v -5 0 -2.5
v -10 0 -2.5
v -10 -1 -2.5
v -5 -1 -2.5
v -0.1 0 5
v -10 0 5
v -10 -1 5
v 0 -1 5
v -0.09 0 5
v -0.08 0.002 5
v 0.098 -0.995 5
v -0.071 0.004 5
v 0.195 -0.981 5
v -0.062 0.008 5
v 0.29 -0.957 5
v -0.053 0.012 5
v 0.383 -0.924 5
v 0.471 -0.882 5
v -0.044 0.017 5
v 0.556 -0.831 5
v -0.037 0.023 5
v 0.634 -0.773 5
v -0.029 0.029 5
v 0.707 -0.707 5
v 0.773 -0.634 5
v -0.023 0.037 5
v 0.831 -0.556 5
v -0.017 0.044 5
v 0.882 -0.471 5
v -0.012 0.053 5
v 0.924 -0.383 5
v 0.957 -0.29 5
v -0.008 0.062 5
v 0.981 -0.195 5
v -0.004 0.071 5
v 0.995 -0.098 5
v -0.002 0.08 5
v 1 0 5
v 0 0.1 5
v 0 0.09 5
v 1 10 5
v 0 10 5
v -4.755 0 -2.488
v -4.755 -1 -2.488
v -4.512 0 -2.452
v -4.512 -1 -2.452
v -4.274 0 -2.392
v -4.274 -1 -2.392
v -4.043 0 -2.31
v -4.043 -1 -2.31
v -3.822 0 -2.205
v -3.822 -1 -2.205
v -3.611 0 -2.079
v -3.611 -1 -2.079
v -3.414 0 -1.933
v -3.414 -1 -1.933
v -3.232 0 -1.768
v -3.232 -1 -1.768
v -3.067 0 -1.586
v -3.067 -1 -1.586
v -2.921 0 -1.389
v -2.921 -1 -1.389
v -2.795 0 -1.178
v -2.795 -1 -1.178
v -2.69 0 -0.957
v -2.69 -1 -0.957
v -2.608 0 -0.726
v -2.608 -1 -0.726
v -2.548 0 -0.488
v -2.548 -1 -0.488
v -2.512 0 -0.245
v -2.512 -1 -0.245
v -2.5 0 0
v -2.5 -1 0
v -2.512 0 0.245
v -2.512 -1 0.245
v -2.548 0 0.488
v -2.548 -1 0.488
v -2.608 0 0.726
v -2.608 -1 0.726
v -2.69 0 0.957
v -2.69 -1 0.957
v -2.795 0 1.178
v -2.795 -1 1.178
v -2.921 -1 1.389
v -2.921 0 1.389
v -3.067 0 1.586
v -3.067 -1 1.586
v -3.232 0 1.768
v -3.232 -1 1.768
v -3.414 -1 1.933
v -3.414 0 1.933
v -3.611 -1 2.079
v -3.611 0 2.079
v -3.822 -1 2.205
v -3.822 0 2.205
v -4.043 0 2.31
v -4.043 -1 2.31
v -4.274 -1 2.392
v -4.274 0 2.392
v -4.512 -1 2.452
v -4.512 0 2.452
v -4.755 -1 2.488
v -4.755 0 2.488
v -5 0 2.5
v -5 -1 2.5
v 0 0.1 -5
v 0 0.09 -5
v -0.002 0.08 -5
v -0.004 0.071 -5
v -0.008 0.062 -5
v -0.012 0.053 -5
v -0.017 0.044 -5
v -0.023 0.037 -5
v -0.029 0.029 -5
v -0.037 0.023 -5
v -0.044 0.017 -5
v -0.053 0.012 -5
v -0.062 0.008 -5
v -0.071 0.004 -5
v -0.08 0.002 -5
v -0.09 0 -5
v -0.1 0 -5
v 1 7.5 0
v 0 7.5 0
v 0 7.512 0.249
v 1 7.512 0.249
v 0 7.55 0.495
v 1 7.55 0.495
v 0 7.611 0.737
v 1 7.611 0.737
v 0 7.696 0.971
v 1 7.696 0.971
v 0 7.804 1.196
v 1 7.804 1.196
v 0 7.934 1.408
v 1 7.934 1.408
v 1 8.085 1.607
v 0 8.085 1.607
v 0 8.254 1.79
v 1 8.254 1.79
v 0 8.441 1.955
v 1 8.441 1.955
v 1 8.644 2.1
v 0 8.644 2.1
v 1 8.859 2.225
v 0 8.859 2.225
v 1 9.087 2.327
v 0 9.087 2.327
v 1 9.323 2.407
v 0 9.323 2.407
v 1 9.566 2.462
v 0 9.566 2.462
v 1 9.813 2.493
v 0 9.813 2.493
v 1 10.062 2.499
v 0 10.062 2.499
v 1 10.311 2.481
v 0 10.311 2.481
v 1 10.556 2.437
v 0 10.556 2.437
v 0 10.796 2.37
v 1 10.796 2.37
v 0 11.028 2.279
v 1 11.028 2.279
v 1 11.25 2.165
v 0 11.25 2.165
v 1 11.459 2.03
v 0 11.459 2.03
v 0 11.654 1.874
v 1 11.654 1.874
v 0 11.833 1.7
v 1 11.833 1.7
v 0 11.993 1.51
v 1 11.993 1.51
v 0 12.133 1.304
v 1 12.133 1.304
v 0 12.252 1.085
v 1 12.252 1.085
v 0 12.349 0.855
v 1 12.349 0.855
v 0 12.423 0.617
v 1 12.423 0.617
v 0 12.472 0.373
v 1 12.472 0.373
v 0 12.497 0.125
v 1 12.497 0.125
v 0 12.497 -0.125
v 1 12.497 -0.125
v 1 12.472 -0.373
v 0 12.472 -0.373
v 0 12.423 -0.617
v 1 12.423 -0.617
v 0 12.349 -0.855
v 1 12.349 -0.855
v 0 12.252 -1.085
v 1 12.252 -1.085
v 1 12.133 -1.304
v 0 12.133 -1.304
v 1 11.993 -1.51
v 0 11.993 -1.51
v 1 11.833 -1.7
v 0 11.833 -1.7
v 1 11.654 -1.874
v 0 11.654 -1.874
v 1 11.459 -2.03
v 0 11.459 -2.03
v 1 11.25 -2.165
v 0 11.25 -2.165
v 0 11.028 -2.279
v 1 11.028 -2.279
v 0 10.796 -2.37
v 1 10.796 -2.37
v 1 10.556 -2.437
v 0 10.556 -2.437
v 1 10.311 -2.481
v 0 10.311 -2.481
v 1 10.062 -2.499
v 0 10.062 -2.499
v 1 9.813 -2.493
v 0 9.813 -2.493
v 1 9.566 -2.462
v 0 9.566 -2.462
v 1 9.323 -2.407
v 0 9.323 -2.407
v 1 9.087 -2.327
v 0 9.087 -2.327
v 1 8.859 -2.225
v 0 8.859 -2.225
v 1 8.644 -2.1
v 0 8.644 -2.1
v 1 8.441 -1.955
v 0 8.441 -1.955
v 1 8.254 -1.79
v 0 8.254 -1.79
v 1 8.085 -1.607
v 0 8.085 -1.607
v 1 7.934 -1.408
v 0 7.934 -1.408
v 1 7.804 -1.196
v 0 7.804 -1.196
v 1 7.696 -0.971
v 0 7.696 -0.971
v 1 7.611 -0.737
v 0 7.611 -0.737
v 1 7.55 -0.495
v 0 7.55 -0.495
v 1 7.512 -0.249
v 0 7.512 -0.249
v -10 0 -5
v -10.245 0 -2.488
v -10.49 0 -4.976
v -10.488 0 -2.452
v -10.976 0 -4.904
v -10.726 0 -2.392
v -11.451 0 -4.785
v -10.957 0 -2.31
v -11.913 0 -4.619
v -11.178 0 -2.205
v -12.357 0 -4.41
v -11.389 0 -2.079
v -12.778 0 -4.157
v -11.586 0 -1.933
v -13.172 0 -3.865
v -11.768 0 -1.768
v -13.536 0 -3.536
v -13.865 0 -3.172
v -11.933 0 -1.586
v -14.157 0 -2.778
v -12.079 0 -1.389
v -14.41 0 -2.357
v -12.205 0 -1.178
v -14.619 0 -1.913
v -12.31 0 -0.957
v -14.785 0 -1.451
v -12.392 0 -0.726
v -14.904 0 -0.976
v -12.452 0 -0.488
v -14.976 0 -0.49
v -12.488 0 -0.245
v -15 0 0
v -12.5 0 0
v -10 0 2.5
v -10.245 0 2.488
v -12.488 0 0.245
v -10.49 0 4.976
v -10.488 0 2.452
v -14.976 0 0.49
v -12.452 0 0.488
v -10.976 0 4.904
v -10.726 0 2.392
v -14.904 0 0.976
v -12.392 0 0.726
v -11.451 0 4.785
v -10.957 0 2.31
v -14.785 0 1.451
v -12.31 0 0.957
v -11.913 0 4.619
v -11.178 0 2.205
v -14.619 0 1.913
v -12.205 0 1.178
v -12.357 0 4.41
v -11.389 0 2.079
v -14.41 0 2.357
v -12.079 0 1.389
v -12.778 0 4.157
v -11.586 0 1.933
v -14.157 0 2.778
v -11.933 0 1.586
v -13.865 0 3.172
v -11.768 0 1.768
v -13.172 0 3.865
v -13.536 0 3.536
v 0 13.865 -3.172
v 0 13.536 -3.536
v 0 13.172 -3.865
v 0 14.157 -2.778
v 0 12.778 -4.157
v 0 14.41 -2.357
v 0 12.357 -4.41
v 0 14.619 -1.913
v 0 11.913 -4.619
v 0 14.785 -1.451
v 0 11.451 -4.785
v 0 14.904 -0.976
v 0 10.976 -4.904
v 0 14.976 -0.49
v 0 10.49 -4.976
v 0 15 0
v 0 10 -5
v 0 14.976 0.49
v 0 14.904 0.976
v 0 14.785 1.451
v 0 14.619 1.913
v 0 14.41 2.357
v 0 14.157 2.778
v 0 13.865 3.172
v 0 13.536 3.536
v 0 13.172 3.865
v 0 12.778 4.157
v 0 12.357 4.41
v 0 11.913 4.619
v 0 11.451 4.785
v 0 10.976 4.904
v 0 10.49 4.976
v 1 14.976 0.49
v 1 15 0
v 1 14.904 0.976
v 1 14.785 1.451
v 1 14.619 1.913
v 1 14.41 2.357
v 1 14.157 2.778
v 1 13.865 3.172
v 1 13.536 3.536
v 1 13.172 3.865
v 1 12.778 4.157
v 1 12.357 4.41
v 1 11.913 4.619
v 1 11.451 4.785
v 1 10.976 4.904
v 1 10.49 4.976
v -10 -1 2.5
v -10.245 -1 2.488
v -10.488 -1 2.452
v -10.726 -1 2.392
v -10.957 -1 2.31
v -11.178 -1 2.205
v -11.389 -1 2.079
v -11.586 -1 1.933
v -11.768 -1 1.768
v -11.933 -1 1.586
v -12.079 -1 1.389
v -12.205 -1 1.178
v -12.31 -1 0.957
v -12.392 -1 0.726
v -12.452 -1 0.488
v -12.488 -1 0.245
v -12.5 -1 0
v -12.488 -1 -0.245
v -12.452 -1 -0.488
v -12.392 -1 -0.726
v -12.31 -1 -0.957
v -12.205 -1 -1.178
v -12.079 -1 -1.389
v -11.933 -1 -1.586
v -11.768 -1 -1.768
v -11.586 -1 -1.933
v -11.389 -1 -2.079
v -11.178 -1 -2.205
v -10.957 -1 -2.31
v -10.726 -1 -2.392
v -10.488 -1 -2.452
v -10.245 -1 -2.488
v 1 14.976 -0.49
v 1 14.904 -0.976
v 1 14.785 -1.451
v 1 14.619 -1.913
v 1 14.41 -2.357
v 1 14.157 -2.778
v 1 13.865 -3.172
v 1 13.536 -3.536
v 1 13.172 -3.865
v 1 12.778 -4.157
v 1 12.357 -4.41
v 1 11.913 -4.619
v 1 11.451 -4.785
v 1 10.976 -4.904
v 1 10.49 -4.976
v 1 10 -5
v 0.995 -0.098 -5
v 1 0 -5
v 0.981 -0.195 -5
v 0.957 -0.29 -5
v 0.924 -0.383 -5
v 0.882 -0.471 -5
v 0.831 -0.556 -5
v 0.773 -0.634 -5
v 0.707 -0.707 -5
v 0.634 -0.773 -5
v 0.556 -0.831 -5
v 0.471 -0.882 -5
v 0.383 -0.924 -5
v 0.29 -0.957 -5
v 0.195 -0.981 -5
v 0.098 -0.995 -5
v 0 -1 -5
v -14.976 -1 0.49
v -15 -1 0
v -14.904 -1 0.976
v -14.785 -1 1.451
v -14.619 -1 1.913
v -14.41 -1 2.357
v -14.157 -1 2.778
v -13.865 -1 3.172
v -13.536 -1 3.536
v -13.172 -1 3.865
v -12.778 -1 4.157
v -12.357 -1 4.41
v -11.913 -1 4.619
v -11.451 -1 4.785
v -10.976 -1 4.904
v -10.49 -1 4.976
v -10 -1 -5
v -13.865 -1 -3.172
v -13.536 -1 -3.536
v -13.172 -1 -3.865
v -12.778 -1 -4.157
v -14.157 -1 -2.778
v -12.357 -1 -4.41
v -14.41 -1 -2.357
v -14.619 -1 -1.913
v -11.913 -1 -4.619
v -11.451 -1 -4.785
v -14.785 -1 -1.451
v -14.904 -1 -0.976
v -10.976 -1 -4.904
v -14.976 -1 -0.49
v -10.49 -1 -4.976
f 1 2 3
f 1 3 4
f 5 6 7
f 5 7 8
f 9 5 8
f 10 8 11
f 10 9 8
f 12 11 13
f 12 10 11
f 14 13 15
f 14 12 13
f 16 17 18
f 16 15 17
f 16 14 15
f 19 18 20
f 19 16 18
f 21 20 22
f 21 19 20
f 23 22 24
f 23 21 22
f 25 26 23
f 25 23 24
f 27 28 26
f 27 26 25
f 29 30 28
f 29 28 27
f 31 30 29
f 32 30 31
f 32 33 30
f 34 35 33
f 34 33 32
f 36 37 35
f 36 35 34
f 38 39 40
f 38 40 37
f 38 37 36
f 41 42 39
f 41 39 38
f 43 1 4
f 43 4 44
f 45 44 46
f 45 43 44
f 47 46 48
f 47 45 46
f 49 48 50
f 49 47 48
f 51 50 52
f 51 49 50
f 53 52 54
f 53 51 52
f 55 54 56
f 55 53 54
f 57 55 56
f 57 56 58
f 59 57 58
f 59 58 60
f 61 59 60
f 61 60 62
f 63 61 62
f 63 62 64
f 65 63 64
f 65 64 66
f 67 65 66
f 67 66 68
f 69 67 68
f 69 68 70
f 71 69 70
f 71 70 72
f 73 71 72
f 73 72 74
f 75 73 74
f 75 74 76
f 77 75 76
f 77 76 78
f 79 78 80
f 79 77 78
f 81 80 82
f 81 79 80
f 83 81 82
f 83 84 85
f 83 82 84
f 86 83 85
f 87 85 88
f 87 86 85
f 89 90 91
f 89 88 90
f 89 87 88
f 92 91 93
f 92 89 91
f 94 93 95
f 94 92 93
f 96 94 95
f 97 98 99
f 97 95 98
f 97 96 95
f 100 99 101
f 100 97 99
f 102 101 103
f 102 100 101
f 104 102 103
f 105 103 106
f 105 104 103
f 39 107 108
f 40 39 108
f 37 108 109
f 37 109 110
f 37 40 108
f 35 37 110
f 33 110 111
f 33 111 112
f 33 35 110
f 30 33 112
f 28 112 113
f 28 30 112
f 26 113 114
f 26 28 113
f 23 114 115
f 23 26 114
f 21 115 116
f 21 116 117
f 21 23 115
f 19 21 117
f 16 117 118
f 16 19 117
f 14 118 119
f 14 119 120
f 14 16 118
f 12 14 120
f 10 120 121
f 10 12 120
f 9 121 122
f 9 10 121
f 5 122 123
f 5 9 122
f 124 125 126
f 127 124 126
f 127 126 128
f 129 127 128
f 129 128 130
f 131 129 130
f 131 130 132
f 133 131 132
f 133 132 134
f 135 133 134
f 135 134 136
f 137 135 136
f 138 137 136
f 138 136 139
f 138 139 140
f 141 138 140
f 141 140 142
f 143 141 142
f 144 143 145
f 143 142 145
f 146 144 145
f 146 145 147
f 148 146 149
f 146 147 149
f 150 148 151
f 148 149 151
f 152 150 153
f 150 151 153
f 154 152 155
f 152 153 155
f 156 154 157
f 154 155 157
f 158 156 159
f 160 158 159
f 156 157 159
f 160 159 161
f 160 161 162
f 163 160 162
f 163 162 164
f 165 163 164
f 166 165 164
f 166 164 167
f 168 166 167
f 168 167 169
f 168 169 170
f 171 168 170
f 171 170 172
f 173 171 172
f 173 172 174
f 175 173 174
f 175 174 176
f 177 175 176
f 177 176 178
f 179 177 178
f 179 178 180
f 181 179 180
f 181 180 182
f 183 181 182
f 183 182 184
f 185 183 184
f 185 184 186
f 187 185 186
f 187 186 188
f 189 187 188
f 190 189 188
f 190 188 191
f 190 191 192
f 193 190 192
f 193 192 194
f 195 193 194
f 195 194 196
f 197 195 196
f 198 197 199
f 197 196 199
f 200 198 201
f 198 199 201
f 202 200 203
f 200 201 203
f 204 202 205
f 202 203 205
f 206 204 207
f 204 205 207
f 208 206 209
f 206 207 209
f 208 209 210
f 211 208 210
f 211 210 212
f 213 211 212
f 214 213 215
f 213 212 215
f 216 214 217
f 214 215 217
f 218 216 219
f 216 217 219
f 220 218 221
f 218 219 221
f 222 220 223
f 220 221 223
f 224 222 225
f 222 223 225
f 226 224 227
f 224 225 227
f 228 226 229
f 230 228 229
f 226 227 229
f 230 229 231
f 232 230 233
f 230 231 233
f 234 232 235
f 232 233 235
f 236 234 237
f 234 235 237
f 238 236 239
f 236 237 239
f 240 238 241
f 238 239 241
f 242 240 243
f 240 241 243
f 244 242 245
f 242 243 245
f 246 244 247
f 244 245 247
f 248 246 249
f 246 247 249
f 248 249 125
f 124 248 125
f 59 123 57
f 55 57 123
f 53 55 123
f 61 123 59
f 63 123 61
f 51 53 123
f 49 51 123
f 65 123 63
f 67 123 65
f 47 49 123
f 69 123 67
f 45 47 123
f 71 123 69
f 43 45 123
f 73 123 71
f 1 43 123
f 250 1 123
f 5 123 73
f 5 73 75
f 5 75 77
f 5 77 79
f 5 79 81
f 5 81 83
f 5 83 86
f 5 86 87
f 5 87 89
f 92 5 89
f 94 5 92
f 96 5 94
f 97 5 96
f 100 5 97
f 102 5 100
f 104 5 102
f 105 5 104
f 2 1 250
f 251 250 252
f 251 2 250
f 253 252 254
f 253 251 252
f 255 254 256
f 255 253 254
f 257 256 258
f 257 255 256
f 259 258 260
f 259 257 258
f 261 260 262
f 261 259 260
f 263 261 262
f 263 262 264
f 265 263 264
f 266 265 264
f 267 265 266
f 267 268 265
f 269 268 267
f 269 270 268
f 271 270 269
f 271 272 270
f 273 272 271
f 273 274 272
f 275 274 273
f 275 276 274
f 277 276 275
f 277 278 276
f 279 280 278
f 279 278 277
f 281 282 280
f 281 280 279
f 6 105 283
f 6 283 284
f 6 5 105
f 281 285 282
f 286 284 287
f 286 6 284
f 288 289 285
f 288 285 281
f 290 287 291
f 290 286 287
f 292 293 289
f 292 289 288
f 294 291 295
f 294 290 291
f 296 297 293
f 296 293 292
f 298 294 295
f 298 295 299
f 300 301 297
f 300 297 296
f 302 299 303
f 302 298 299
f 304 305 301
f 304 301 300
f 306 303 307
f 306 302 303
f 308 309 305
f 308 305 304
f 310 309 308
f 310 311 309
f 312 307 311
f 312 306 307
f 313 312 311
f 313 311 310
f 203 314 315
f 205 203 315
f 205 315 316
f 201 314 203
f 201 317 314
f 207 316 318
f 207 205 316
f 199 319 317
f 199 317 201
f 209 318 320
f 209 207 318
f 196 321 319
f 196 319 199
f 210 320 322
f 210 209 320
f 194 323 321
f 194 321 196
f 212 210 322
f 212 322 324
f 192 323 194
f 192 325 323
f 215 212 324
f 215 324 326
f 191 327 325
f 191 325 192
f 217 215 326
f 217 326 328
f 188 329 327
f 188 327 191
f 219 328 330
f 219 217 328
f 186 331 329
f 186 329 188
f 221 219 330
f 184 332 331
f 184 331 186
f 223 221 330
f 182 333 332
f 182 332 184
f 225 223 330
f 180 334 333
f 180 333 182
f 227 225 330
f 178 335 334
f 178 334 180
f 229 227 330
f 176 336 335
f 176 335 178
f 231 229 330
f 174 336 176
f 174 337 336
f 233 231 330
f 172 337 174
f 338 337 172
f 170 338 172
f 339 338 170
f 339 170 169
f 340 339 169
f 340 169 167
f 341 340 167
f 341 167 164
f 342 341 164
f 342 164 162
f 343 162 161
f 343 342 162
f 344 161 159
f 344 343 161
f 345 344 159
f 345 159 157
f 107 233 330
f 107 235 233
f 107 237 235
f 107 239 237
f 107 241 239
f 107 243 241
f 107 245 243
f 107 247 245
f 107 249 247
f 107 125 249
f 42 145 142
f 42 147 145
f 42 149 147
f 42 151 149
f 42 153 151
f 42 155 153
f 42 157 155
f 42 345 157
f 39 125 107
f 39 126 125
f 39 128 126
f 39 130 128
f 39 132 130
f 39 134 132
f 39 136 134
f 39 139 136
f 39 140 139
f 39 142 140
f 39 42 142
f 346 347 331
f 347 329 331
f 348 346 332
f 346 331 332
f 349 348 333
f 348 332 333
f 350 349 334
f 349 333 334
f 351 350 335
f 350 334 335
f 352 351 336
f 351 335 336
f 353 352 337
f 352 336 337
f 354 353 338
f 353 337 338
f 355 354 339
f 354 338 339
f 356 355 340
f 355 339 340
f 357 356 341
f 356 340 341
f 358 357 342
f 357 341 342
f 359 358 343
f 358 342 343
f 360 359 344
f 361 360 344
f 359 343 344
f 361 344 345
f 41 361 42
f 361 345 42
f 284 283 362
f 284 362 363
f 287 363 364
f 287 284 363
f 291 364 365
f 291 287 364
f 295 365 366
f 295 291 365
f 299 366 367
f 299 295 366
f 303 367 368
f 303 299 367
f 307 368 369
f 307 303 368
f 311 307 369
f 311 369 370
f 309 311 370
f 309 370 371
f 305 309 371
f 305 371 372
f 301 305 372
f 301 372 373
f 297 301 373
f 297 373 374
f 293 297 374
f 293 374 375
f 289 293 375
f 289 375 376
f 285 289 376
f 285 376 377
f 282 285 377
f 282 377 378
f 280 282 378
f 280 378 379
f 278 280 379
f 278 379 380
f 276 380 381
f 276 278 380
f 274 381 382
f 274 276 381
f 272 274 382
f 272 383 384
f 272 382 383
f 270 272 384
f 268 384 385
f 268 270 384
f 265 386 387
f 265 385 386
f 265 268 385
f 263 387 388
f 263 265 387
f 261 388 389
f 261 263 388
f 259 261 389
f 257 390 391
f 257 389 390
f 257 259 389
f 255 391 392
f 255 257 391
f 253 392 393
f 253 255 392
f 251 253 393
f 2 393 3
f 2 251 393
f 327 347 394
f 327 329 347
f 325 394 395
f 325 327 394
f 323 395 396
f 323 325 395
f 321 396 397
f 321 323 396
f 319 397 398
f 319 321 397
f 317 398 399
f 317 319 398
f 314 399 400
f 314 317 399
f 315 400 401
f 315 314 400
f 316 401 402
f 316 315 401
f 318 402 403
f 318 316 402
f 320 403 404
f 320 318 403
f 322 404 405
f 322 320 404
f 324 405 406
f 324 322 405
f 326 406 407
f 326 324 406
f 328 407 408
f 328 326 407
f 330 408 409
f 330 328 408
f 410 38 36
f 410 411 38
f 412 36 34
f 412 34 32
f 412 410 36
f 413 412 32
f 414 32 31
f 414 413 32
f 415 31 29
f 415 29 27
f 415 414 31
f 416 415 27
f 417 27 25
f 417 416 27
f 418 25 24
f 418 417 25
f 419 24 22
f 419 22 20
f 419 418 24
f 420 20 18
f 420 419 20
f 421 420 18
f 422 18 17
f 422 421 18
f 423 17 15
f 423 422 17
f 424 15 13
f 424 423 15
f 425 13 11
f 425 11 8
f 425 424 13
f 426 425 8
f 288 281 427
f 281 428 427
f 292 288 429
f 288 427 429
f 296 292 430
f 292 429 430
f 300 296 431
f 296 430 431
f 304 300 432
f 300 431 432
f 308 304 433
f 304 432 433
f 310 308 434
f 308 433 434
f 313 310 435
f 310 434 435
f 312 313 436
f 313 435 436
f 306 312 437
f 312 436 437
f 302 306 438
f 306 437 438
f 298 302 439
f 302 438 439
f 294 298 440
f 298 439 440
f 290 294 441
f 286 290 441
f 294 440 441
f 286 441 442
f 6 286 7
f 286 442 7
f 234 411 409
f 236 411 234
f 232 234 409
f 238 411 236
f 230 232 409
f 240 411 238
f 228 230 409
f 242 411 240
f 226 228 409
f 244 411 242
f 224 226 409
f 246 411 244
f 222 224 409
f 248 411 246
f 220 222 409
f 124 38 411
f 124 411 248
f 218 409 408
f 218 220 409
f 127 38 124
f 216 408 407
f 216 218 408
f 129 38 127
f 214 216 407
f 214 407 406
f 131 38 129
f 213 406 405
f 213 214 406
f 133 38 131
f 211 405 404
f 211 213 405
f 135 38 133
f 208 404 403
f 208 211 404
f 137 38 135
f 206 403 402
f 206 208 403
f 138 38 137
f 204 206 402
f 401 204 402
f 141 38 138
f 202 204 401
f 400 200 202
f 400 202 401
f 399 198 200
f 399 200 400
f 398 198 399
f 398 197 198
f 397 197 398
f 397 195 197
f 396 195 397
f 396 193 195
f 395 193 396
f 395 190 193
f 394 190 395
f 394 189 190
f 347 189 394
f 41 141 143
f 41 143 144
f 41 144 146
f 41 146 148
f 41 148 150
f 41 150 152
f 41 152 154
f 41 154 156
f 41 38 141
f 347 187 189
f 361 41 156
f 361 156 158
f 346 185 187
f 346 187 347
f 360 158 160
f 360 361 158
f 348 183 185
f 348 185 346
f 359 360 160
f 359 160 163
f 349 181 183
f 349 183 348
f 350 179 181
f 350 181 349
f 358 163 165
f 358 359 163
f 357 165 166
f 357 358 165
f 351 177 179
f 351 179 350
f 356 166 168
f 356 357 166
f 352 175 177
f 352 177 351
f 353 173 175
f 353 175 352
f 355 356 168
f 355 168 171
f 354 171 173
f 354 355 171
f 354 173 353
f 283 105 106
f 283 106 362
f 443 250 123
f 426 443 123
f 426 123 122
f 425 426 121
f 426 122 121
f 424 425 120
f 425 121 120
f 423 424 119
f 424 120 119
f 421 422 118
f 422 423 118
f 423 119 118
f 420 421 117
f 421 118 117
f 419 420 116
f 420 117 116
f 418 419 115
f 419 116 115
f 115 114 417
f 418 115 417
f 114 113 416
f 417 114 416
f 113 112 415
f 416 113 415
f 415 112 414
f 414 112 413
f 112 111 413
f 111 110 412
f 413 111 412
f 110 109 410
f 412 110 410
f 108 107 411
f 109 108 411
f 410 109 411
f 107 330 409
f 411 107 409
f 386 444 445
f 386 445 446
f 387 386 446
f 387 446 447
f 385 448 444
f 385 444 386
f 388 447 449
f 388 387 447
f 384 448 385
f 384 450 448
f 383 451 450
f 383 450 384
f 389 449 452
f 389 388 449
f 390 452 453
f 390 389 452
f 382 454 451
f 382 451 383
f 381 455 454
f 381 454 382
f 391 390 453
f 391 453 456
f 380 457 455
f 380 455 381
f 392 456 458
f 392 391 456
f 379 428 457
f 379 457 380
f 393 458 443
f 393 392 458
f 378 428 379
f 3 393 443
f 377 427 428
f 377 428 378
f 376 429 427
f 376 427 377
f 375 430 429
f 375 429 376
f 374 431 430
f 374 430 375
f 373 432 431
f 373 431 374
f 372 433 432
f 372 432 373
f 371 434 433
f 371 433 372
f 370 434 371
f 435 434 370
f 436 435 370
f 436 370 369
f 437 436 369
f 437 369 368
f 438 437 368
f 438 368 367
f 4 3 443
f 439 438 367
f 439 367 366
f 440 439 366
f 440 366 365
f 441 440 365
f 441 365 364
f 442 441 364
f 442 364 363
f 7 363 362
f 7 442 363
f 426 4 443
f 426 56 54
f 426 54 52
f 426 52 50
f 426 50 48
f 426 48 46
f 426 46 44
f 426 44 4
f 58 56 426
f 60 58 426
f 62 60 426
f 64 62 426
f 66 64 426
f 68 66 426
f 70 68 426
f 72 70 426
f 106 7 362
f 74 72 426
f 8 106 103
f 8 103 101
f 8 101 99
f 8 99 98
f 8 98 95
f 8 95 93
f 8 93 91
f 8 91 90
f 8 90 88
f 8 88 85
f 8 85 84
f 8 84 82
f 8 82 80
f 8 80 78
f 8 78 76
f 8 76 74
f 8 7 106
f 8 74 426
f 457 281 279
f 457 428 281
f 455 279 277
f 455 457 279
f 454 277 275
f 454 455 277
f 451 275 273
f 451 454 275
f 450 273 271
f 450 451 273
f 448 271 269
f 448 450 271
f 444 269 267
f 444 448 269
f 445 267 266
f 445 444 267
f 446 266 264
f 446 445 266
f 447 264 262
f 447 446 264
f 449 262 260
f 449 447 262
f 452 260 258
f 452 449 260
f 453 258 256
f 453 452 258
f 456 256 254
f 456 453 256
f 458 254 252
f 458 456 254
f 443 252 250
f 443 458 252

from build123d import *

# Parameters (mm, degrees)
LINEAR_AUSTRAGEN_D_NN1_DEPTH    = 5
VERRUNDUNG1_R                   = 5
VERRUNDUNG2_R                   = 1
VERRUNDUNG3_R                   = 0.1
SKIZZE2_R                       = 2.5
SCHNITT_LINEAR_AUSTRAGEN1_DEPTH = 10
SCHNITT_LINEAR_AUSTRAGEN2_DEPTH = 10


with BuildPart() as part:
    # Skizze1 → Linear-Austragen-Dünn1 (new, symmetric)
    with BuildSketch(Plane.XY):
        Polygon((0, 15), (0, 0), (-15, 0), (-15, -1), (1, -1), (1, 15), align=None)
    extrude(amount=LINEAR_AUSTRAGEN_D_NN1_DEPTH, both=True)

    # Verrundung1
    verrundung1_edges = [part.edges().sort_by_distance(p)[0] for p in [
        (-15, -0.5, -5),
        (-15, -0.5, 5),
        (0.5, 15, -5),
        (0.5, 15, 5),
    ]]
    fillet(verrundung1_edges, radius=VERRUNDUNG1_R - 0.0001)  # a hair under: the kernel refuses the full size

    # Verrundung2
    verrundung2_edges = [part.edges().sort_by_distance(p)[0] for p in [
        (1, -1, 0),
    ]]
    fillet(verrundung2_edges, radius=VERRUNDUNG2_R)

    # Verrundung3
    verrundung3_edges = [part.edges().sort_by_distance(p)[0] for p in [
        (0, 0, 0),
    ]]
    fillet(verrundung3_edges, radius=VERRUNDUNG3_R)

    # Skizze2 → Schnitt-Linear austragen1 (cut)
    with BuildSketch(Plane.ZY):
        with Locations(Location((0, 10, 0), (0, 0, 270))):
            Circle(SKIZZE2_R)
    extrude(amount=-SCHNITT_LINEAR_AUSTRAGEN1_DEPTH, mode=Mode.SUBTRACT)

    # Skizze3 → Schnitt-Linear austragen2 (cut)
    with BuildSketch(Plane(origin=(0, 0, 0), x_dir=(1, 0, 0), z_dir=(0, 1, 0))):
        with BuildLine():
            Line((-10, 2.5), (-5, 2.5))
            ThreePointArc((-5, 2.5), (-2.5, 0), (-5, -2.5))
            Line((-5, -2.5), (-10, -2.5))
            ThreePointArc((-10, -2.5), (-12.5, 0), (-10, 2.5))
        make_face()
    extrude(amount=-SCHNITT_LINEAR_AUSTRAGEN2_DEPTH, mode=Mode.SUBTRACT)


solid = part.part
